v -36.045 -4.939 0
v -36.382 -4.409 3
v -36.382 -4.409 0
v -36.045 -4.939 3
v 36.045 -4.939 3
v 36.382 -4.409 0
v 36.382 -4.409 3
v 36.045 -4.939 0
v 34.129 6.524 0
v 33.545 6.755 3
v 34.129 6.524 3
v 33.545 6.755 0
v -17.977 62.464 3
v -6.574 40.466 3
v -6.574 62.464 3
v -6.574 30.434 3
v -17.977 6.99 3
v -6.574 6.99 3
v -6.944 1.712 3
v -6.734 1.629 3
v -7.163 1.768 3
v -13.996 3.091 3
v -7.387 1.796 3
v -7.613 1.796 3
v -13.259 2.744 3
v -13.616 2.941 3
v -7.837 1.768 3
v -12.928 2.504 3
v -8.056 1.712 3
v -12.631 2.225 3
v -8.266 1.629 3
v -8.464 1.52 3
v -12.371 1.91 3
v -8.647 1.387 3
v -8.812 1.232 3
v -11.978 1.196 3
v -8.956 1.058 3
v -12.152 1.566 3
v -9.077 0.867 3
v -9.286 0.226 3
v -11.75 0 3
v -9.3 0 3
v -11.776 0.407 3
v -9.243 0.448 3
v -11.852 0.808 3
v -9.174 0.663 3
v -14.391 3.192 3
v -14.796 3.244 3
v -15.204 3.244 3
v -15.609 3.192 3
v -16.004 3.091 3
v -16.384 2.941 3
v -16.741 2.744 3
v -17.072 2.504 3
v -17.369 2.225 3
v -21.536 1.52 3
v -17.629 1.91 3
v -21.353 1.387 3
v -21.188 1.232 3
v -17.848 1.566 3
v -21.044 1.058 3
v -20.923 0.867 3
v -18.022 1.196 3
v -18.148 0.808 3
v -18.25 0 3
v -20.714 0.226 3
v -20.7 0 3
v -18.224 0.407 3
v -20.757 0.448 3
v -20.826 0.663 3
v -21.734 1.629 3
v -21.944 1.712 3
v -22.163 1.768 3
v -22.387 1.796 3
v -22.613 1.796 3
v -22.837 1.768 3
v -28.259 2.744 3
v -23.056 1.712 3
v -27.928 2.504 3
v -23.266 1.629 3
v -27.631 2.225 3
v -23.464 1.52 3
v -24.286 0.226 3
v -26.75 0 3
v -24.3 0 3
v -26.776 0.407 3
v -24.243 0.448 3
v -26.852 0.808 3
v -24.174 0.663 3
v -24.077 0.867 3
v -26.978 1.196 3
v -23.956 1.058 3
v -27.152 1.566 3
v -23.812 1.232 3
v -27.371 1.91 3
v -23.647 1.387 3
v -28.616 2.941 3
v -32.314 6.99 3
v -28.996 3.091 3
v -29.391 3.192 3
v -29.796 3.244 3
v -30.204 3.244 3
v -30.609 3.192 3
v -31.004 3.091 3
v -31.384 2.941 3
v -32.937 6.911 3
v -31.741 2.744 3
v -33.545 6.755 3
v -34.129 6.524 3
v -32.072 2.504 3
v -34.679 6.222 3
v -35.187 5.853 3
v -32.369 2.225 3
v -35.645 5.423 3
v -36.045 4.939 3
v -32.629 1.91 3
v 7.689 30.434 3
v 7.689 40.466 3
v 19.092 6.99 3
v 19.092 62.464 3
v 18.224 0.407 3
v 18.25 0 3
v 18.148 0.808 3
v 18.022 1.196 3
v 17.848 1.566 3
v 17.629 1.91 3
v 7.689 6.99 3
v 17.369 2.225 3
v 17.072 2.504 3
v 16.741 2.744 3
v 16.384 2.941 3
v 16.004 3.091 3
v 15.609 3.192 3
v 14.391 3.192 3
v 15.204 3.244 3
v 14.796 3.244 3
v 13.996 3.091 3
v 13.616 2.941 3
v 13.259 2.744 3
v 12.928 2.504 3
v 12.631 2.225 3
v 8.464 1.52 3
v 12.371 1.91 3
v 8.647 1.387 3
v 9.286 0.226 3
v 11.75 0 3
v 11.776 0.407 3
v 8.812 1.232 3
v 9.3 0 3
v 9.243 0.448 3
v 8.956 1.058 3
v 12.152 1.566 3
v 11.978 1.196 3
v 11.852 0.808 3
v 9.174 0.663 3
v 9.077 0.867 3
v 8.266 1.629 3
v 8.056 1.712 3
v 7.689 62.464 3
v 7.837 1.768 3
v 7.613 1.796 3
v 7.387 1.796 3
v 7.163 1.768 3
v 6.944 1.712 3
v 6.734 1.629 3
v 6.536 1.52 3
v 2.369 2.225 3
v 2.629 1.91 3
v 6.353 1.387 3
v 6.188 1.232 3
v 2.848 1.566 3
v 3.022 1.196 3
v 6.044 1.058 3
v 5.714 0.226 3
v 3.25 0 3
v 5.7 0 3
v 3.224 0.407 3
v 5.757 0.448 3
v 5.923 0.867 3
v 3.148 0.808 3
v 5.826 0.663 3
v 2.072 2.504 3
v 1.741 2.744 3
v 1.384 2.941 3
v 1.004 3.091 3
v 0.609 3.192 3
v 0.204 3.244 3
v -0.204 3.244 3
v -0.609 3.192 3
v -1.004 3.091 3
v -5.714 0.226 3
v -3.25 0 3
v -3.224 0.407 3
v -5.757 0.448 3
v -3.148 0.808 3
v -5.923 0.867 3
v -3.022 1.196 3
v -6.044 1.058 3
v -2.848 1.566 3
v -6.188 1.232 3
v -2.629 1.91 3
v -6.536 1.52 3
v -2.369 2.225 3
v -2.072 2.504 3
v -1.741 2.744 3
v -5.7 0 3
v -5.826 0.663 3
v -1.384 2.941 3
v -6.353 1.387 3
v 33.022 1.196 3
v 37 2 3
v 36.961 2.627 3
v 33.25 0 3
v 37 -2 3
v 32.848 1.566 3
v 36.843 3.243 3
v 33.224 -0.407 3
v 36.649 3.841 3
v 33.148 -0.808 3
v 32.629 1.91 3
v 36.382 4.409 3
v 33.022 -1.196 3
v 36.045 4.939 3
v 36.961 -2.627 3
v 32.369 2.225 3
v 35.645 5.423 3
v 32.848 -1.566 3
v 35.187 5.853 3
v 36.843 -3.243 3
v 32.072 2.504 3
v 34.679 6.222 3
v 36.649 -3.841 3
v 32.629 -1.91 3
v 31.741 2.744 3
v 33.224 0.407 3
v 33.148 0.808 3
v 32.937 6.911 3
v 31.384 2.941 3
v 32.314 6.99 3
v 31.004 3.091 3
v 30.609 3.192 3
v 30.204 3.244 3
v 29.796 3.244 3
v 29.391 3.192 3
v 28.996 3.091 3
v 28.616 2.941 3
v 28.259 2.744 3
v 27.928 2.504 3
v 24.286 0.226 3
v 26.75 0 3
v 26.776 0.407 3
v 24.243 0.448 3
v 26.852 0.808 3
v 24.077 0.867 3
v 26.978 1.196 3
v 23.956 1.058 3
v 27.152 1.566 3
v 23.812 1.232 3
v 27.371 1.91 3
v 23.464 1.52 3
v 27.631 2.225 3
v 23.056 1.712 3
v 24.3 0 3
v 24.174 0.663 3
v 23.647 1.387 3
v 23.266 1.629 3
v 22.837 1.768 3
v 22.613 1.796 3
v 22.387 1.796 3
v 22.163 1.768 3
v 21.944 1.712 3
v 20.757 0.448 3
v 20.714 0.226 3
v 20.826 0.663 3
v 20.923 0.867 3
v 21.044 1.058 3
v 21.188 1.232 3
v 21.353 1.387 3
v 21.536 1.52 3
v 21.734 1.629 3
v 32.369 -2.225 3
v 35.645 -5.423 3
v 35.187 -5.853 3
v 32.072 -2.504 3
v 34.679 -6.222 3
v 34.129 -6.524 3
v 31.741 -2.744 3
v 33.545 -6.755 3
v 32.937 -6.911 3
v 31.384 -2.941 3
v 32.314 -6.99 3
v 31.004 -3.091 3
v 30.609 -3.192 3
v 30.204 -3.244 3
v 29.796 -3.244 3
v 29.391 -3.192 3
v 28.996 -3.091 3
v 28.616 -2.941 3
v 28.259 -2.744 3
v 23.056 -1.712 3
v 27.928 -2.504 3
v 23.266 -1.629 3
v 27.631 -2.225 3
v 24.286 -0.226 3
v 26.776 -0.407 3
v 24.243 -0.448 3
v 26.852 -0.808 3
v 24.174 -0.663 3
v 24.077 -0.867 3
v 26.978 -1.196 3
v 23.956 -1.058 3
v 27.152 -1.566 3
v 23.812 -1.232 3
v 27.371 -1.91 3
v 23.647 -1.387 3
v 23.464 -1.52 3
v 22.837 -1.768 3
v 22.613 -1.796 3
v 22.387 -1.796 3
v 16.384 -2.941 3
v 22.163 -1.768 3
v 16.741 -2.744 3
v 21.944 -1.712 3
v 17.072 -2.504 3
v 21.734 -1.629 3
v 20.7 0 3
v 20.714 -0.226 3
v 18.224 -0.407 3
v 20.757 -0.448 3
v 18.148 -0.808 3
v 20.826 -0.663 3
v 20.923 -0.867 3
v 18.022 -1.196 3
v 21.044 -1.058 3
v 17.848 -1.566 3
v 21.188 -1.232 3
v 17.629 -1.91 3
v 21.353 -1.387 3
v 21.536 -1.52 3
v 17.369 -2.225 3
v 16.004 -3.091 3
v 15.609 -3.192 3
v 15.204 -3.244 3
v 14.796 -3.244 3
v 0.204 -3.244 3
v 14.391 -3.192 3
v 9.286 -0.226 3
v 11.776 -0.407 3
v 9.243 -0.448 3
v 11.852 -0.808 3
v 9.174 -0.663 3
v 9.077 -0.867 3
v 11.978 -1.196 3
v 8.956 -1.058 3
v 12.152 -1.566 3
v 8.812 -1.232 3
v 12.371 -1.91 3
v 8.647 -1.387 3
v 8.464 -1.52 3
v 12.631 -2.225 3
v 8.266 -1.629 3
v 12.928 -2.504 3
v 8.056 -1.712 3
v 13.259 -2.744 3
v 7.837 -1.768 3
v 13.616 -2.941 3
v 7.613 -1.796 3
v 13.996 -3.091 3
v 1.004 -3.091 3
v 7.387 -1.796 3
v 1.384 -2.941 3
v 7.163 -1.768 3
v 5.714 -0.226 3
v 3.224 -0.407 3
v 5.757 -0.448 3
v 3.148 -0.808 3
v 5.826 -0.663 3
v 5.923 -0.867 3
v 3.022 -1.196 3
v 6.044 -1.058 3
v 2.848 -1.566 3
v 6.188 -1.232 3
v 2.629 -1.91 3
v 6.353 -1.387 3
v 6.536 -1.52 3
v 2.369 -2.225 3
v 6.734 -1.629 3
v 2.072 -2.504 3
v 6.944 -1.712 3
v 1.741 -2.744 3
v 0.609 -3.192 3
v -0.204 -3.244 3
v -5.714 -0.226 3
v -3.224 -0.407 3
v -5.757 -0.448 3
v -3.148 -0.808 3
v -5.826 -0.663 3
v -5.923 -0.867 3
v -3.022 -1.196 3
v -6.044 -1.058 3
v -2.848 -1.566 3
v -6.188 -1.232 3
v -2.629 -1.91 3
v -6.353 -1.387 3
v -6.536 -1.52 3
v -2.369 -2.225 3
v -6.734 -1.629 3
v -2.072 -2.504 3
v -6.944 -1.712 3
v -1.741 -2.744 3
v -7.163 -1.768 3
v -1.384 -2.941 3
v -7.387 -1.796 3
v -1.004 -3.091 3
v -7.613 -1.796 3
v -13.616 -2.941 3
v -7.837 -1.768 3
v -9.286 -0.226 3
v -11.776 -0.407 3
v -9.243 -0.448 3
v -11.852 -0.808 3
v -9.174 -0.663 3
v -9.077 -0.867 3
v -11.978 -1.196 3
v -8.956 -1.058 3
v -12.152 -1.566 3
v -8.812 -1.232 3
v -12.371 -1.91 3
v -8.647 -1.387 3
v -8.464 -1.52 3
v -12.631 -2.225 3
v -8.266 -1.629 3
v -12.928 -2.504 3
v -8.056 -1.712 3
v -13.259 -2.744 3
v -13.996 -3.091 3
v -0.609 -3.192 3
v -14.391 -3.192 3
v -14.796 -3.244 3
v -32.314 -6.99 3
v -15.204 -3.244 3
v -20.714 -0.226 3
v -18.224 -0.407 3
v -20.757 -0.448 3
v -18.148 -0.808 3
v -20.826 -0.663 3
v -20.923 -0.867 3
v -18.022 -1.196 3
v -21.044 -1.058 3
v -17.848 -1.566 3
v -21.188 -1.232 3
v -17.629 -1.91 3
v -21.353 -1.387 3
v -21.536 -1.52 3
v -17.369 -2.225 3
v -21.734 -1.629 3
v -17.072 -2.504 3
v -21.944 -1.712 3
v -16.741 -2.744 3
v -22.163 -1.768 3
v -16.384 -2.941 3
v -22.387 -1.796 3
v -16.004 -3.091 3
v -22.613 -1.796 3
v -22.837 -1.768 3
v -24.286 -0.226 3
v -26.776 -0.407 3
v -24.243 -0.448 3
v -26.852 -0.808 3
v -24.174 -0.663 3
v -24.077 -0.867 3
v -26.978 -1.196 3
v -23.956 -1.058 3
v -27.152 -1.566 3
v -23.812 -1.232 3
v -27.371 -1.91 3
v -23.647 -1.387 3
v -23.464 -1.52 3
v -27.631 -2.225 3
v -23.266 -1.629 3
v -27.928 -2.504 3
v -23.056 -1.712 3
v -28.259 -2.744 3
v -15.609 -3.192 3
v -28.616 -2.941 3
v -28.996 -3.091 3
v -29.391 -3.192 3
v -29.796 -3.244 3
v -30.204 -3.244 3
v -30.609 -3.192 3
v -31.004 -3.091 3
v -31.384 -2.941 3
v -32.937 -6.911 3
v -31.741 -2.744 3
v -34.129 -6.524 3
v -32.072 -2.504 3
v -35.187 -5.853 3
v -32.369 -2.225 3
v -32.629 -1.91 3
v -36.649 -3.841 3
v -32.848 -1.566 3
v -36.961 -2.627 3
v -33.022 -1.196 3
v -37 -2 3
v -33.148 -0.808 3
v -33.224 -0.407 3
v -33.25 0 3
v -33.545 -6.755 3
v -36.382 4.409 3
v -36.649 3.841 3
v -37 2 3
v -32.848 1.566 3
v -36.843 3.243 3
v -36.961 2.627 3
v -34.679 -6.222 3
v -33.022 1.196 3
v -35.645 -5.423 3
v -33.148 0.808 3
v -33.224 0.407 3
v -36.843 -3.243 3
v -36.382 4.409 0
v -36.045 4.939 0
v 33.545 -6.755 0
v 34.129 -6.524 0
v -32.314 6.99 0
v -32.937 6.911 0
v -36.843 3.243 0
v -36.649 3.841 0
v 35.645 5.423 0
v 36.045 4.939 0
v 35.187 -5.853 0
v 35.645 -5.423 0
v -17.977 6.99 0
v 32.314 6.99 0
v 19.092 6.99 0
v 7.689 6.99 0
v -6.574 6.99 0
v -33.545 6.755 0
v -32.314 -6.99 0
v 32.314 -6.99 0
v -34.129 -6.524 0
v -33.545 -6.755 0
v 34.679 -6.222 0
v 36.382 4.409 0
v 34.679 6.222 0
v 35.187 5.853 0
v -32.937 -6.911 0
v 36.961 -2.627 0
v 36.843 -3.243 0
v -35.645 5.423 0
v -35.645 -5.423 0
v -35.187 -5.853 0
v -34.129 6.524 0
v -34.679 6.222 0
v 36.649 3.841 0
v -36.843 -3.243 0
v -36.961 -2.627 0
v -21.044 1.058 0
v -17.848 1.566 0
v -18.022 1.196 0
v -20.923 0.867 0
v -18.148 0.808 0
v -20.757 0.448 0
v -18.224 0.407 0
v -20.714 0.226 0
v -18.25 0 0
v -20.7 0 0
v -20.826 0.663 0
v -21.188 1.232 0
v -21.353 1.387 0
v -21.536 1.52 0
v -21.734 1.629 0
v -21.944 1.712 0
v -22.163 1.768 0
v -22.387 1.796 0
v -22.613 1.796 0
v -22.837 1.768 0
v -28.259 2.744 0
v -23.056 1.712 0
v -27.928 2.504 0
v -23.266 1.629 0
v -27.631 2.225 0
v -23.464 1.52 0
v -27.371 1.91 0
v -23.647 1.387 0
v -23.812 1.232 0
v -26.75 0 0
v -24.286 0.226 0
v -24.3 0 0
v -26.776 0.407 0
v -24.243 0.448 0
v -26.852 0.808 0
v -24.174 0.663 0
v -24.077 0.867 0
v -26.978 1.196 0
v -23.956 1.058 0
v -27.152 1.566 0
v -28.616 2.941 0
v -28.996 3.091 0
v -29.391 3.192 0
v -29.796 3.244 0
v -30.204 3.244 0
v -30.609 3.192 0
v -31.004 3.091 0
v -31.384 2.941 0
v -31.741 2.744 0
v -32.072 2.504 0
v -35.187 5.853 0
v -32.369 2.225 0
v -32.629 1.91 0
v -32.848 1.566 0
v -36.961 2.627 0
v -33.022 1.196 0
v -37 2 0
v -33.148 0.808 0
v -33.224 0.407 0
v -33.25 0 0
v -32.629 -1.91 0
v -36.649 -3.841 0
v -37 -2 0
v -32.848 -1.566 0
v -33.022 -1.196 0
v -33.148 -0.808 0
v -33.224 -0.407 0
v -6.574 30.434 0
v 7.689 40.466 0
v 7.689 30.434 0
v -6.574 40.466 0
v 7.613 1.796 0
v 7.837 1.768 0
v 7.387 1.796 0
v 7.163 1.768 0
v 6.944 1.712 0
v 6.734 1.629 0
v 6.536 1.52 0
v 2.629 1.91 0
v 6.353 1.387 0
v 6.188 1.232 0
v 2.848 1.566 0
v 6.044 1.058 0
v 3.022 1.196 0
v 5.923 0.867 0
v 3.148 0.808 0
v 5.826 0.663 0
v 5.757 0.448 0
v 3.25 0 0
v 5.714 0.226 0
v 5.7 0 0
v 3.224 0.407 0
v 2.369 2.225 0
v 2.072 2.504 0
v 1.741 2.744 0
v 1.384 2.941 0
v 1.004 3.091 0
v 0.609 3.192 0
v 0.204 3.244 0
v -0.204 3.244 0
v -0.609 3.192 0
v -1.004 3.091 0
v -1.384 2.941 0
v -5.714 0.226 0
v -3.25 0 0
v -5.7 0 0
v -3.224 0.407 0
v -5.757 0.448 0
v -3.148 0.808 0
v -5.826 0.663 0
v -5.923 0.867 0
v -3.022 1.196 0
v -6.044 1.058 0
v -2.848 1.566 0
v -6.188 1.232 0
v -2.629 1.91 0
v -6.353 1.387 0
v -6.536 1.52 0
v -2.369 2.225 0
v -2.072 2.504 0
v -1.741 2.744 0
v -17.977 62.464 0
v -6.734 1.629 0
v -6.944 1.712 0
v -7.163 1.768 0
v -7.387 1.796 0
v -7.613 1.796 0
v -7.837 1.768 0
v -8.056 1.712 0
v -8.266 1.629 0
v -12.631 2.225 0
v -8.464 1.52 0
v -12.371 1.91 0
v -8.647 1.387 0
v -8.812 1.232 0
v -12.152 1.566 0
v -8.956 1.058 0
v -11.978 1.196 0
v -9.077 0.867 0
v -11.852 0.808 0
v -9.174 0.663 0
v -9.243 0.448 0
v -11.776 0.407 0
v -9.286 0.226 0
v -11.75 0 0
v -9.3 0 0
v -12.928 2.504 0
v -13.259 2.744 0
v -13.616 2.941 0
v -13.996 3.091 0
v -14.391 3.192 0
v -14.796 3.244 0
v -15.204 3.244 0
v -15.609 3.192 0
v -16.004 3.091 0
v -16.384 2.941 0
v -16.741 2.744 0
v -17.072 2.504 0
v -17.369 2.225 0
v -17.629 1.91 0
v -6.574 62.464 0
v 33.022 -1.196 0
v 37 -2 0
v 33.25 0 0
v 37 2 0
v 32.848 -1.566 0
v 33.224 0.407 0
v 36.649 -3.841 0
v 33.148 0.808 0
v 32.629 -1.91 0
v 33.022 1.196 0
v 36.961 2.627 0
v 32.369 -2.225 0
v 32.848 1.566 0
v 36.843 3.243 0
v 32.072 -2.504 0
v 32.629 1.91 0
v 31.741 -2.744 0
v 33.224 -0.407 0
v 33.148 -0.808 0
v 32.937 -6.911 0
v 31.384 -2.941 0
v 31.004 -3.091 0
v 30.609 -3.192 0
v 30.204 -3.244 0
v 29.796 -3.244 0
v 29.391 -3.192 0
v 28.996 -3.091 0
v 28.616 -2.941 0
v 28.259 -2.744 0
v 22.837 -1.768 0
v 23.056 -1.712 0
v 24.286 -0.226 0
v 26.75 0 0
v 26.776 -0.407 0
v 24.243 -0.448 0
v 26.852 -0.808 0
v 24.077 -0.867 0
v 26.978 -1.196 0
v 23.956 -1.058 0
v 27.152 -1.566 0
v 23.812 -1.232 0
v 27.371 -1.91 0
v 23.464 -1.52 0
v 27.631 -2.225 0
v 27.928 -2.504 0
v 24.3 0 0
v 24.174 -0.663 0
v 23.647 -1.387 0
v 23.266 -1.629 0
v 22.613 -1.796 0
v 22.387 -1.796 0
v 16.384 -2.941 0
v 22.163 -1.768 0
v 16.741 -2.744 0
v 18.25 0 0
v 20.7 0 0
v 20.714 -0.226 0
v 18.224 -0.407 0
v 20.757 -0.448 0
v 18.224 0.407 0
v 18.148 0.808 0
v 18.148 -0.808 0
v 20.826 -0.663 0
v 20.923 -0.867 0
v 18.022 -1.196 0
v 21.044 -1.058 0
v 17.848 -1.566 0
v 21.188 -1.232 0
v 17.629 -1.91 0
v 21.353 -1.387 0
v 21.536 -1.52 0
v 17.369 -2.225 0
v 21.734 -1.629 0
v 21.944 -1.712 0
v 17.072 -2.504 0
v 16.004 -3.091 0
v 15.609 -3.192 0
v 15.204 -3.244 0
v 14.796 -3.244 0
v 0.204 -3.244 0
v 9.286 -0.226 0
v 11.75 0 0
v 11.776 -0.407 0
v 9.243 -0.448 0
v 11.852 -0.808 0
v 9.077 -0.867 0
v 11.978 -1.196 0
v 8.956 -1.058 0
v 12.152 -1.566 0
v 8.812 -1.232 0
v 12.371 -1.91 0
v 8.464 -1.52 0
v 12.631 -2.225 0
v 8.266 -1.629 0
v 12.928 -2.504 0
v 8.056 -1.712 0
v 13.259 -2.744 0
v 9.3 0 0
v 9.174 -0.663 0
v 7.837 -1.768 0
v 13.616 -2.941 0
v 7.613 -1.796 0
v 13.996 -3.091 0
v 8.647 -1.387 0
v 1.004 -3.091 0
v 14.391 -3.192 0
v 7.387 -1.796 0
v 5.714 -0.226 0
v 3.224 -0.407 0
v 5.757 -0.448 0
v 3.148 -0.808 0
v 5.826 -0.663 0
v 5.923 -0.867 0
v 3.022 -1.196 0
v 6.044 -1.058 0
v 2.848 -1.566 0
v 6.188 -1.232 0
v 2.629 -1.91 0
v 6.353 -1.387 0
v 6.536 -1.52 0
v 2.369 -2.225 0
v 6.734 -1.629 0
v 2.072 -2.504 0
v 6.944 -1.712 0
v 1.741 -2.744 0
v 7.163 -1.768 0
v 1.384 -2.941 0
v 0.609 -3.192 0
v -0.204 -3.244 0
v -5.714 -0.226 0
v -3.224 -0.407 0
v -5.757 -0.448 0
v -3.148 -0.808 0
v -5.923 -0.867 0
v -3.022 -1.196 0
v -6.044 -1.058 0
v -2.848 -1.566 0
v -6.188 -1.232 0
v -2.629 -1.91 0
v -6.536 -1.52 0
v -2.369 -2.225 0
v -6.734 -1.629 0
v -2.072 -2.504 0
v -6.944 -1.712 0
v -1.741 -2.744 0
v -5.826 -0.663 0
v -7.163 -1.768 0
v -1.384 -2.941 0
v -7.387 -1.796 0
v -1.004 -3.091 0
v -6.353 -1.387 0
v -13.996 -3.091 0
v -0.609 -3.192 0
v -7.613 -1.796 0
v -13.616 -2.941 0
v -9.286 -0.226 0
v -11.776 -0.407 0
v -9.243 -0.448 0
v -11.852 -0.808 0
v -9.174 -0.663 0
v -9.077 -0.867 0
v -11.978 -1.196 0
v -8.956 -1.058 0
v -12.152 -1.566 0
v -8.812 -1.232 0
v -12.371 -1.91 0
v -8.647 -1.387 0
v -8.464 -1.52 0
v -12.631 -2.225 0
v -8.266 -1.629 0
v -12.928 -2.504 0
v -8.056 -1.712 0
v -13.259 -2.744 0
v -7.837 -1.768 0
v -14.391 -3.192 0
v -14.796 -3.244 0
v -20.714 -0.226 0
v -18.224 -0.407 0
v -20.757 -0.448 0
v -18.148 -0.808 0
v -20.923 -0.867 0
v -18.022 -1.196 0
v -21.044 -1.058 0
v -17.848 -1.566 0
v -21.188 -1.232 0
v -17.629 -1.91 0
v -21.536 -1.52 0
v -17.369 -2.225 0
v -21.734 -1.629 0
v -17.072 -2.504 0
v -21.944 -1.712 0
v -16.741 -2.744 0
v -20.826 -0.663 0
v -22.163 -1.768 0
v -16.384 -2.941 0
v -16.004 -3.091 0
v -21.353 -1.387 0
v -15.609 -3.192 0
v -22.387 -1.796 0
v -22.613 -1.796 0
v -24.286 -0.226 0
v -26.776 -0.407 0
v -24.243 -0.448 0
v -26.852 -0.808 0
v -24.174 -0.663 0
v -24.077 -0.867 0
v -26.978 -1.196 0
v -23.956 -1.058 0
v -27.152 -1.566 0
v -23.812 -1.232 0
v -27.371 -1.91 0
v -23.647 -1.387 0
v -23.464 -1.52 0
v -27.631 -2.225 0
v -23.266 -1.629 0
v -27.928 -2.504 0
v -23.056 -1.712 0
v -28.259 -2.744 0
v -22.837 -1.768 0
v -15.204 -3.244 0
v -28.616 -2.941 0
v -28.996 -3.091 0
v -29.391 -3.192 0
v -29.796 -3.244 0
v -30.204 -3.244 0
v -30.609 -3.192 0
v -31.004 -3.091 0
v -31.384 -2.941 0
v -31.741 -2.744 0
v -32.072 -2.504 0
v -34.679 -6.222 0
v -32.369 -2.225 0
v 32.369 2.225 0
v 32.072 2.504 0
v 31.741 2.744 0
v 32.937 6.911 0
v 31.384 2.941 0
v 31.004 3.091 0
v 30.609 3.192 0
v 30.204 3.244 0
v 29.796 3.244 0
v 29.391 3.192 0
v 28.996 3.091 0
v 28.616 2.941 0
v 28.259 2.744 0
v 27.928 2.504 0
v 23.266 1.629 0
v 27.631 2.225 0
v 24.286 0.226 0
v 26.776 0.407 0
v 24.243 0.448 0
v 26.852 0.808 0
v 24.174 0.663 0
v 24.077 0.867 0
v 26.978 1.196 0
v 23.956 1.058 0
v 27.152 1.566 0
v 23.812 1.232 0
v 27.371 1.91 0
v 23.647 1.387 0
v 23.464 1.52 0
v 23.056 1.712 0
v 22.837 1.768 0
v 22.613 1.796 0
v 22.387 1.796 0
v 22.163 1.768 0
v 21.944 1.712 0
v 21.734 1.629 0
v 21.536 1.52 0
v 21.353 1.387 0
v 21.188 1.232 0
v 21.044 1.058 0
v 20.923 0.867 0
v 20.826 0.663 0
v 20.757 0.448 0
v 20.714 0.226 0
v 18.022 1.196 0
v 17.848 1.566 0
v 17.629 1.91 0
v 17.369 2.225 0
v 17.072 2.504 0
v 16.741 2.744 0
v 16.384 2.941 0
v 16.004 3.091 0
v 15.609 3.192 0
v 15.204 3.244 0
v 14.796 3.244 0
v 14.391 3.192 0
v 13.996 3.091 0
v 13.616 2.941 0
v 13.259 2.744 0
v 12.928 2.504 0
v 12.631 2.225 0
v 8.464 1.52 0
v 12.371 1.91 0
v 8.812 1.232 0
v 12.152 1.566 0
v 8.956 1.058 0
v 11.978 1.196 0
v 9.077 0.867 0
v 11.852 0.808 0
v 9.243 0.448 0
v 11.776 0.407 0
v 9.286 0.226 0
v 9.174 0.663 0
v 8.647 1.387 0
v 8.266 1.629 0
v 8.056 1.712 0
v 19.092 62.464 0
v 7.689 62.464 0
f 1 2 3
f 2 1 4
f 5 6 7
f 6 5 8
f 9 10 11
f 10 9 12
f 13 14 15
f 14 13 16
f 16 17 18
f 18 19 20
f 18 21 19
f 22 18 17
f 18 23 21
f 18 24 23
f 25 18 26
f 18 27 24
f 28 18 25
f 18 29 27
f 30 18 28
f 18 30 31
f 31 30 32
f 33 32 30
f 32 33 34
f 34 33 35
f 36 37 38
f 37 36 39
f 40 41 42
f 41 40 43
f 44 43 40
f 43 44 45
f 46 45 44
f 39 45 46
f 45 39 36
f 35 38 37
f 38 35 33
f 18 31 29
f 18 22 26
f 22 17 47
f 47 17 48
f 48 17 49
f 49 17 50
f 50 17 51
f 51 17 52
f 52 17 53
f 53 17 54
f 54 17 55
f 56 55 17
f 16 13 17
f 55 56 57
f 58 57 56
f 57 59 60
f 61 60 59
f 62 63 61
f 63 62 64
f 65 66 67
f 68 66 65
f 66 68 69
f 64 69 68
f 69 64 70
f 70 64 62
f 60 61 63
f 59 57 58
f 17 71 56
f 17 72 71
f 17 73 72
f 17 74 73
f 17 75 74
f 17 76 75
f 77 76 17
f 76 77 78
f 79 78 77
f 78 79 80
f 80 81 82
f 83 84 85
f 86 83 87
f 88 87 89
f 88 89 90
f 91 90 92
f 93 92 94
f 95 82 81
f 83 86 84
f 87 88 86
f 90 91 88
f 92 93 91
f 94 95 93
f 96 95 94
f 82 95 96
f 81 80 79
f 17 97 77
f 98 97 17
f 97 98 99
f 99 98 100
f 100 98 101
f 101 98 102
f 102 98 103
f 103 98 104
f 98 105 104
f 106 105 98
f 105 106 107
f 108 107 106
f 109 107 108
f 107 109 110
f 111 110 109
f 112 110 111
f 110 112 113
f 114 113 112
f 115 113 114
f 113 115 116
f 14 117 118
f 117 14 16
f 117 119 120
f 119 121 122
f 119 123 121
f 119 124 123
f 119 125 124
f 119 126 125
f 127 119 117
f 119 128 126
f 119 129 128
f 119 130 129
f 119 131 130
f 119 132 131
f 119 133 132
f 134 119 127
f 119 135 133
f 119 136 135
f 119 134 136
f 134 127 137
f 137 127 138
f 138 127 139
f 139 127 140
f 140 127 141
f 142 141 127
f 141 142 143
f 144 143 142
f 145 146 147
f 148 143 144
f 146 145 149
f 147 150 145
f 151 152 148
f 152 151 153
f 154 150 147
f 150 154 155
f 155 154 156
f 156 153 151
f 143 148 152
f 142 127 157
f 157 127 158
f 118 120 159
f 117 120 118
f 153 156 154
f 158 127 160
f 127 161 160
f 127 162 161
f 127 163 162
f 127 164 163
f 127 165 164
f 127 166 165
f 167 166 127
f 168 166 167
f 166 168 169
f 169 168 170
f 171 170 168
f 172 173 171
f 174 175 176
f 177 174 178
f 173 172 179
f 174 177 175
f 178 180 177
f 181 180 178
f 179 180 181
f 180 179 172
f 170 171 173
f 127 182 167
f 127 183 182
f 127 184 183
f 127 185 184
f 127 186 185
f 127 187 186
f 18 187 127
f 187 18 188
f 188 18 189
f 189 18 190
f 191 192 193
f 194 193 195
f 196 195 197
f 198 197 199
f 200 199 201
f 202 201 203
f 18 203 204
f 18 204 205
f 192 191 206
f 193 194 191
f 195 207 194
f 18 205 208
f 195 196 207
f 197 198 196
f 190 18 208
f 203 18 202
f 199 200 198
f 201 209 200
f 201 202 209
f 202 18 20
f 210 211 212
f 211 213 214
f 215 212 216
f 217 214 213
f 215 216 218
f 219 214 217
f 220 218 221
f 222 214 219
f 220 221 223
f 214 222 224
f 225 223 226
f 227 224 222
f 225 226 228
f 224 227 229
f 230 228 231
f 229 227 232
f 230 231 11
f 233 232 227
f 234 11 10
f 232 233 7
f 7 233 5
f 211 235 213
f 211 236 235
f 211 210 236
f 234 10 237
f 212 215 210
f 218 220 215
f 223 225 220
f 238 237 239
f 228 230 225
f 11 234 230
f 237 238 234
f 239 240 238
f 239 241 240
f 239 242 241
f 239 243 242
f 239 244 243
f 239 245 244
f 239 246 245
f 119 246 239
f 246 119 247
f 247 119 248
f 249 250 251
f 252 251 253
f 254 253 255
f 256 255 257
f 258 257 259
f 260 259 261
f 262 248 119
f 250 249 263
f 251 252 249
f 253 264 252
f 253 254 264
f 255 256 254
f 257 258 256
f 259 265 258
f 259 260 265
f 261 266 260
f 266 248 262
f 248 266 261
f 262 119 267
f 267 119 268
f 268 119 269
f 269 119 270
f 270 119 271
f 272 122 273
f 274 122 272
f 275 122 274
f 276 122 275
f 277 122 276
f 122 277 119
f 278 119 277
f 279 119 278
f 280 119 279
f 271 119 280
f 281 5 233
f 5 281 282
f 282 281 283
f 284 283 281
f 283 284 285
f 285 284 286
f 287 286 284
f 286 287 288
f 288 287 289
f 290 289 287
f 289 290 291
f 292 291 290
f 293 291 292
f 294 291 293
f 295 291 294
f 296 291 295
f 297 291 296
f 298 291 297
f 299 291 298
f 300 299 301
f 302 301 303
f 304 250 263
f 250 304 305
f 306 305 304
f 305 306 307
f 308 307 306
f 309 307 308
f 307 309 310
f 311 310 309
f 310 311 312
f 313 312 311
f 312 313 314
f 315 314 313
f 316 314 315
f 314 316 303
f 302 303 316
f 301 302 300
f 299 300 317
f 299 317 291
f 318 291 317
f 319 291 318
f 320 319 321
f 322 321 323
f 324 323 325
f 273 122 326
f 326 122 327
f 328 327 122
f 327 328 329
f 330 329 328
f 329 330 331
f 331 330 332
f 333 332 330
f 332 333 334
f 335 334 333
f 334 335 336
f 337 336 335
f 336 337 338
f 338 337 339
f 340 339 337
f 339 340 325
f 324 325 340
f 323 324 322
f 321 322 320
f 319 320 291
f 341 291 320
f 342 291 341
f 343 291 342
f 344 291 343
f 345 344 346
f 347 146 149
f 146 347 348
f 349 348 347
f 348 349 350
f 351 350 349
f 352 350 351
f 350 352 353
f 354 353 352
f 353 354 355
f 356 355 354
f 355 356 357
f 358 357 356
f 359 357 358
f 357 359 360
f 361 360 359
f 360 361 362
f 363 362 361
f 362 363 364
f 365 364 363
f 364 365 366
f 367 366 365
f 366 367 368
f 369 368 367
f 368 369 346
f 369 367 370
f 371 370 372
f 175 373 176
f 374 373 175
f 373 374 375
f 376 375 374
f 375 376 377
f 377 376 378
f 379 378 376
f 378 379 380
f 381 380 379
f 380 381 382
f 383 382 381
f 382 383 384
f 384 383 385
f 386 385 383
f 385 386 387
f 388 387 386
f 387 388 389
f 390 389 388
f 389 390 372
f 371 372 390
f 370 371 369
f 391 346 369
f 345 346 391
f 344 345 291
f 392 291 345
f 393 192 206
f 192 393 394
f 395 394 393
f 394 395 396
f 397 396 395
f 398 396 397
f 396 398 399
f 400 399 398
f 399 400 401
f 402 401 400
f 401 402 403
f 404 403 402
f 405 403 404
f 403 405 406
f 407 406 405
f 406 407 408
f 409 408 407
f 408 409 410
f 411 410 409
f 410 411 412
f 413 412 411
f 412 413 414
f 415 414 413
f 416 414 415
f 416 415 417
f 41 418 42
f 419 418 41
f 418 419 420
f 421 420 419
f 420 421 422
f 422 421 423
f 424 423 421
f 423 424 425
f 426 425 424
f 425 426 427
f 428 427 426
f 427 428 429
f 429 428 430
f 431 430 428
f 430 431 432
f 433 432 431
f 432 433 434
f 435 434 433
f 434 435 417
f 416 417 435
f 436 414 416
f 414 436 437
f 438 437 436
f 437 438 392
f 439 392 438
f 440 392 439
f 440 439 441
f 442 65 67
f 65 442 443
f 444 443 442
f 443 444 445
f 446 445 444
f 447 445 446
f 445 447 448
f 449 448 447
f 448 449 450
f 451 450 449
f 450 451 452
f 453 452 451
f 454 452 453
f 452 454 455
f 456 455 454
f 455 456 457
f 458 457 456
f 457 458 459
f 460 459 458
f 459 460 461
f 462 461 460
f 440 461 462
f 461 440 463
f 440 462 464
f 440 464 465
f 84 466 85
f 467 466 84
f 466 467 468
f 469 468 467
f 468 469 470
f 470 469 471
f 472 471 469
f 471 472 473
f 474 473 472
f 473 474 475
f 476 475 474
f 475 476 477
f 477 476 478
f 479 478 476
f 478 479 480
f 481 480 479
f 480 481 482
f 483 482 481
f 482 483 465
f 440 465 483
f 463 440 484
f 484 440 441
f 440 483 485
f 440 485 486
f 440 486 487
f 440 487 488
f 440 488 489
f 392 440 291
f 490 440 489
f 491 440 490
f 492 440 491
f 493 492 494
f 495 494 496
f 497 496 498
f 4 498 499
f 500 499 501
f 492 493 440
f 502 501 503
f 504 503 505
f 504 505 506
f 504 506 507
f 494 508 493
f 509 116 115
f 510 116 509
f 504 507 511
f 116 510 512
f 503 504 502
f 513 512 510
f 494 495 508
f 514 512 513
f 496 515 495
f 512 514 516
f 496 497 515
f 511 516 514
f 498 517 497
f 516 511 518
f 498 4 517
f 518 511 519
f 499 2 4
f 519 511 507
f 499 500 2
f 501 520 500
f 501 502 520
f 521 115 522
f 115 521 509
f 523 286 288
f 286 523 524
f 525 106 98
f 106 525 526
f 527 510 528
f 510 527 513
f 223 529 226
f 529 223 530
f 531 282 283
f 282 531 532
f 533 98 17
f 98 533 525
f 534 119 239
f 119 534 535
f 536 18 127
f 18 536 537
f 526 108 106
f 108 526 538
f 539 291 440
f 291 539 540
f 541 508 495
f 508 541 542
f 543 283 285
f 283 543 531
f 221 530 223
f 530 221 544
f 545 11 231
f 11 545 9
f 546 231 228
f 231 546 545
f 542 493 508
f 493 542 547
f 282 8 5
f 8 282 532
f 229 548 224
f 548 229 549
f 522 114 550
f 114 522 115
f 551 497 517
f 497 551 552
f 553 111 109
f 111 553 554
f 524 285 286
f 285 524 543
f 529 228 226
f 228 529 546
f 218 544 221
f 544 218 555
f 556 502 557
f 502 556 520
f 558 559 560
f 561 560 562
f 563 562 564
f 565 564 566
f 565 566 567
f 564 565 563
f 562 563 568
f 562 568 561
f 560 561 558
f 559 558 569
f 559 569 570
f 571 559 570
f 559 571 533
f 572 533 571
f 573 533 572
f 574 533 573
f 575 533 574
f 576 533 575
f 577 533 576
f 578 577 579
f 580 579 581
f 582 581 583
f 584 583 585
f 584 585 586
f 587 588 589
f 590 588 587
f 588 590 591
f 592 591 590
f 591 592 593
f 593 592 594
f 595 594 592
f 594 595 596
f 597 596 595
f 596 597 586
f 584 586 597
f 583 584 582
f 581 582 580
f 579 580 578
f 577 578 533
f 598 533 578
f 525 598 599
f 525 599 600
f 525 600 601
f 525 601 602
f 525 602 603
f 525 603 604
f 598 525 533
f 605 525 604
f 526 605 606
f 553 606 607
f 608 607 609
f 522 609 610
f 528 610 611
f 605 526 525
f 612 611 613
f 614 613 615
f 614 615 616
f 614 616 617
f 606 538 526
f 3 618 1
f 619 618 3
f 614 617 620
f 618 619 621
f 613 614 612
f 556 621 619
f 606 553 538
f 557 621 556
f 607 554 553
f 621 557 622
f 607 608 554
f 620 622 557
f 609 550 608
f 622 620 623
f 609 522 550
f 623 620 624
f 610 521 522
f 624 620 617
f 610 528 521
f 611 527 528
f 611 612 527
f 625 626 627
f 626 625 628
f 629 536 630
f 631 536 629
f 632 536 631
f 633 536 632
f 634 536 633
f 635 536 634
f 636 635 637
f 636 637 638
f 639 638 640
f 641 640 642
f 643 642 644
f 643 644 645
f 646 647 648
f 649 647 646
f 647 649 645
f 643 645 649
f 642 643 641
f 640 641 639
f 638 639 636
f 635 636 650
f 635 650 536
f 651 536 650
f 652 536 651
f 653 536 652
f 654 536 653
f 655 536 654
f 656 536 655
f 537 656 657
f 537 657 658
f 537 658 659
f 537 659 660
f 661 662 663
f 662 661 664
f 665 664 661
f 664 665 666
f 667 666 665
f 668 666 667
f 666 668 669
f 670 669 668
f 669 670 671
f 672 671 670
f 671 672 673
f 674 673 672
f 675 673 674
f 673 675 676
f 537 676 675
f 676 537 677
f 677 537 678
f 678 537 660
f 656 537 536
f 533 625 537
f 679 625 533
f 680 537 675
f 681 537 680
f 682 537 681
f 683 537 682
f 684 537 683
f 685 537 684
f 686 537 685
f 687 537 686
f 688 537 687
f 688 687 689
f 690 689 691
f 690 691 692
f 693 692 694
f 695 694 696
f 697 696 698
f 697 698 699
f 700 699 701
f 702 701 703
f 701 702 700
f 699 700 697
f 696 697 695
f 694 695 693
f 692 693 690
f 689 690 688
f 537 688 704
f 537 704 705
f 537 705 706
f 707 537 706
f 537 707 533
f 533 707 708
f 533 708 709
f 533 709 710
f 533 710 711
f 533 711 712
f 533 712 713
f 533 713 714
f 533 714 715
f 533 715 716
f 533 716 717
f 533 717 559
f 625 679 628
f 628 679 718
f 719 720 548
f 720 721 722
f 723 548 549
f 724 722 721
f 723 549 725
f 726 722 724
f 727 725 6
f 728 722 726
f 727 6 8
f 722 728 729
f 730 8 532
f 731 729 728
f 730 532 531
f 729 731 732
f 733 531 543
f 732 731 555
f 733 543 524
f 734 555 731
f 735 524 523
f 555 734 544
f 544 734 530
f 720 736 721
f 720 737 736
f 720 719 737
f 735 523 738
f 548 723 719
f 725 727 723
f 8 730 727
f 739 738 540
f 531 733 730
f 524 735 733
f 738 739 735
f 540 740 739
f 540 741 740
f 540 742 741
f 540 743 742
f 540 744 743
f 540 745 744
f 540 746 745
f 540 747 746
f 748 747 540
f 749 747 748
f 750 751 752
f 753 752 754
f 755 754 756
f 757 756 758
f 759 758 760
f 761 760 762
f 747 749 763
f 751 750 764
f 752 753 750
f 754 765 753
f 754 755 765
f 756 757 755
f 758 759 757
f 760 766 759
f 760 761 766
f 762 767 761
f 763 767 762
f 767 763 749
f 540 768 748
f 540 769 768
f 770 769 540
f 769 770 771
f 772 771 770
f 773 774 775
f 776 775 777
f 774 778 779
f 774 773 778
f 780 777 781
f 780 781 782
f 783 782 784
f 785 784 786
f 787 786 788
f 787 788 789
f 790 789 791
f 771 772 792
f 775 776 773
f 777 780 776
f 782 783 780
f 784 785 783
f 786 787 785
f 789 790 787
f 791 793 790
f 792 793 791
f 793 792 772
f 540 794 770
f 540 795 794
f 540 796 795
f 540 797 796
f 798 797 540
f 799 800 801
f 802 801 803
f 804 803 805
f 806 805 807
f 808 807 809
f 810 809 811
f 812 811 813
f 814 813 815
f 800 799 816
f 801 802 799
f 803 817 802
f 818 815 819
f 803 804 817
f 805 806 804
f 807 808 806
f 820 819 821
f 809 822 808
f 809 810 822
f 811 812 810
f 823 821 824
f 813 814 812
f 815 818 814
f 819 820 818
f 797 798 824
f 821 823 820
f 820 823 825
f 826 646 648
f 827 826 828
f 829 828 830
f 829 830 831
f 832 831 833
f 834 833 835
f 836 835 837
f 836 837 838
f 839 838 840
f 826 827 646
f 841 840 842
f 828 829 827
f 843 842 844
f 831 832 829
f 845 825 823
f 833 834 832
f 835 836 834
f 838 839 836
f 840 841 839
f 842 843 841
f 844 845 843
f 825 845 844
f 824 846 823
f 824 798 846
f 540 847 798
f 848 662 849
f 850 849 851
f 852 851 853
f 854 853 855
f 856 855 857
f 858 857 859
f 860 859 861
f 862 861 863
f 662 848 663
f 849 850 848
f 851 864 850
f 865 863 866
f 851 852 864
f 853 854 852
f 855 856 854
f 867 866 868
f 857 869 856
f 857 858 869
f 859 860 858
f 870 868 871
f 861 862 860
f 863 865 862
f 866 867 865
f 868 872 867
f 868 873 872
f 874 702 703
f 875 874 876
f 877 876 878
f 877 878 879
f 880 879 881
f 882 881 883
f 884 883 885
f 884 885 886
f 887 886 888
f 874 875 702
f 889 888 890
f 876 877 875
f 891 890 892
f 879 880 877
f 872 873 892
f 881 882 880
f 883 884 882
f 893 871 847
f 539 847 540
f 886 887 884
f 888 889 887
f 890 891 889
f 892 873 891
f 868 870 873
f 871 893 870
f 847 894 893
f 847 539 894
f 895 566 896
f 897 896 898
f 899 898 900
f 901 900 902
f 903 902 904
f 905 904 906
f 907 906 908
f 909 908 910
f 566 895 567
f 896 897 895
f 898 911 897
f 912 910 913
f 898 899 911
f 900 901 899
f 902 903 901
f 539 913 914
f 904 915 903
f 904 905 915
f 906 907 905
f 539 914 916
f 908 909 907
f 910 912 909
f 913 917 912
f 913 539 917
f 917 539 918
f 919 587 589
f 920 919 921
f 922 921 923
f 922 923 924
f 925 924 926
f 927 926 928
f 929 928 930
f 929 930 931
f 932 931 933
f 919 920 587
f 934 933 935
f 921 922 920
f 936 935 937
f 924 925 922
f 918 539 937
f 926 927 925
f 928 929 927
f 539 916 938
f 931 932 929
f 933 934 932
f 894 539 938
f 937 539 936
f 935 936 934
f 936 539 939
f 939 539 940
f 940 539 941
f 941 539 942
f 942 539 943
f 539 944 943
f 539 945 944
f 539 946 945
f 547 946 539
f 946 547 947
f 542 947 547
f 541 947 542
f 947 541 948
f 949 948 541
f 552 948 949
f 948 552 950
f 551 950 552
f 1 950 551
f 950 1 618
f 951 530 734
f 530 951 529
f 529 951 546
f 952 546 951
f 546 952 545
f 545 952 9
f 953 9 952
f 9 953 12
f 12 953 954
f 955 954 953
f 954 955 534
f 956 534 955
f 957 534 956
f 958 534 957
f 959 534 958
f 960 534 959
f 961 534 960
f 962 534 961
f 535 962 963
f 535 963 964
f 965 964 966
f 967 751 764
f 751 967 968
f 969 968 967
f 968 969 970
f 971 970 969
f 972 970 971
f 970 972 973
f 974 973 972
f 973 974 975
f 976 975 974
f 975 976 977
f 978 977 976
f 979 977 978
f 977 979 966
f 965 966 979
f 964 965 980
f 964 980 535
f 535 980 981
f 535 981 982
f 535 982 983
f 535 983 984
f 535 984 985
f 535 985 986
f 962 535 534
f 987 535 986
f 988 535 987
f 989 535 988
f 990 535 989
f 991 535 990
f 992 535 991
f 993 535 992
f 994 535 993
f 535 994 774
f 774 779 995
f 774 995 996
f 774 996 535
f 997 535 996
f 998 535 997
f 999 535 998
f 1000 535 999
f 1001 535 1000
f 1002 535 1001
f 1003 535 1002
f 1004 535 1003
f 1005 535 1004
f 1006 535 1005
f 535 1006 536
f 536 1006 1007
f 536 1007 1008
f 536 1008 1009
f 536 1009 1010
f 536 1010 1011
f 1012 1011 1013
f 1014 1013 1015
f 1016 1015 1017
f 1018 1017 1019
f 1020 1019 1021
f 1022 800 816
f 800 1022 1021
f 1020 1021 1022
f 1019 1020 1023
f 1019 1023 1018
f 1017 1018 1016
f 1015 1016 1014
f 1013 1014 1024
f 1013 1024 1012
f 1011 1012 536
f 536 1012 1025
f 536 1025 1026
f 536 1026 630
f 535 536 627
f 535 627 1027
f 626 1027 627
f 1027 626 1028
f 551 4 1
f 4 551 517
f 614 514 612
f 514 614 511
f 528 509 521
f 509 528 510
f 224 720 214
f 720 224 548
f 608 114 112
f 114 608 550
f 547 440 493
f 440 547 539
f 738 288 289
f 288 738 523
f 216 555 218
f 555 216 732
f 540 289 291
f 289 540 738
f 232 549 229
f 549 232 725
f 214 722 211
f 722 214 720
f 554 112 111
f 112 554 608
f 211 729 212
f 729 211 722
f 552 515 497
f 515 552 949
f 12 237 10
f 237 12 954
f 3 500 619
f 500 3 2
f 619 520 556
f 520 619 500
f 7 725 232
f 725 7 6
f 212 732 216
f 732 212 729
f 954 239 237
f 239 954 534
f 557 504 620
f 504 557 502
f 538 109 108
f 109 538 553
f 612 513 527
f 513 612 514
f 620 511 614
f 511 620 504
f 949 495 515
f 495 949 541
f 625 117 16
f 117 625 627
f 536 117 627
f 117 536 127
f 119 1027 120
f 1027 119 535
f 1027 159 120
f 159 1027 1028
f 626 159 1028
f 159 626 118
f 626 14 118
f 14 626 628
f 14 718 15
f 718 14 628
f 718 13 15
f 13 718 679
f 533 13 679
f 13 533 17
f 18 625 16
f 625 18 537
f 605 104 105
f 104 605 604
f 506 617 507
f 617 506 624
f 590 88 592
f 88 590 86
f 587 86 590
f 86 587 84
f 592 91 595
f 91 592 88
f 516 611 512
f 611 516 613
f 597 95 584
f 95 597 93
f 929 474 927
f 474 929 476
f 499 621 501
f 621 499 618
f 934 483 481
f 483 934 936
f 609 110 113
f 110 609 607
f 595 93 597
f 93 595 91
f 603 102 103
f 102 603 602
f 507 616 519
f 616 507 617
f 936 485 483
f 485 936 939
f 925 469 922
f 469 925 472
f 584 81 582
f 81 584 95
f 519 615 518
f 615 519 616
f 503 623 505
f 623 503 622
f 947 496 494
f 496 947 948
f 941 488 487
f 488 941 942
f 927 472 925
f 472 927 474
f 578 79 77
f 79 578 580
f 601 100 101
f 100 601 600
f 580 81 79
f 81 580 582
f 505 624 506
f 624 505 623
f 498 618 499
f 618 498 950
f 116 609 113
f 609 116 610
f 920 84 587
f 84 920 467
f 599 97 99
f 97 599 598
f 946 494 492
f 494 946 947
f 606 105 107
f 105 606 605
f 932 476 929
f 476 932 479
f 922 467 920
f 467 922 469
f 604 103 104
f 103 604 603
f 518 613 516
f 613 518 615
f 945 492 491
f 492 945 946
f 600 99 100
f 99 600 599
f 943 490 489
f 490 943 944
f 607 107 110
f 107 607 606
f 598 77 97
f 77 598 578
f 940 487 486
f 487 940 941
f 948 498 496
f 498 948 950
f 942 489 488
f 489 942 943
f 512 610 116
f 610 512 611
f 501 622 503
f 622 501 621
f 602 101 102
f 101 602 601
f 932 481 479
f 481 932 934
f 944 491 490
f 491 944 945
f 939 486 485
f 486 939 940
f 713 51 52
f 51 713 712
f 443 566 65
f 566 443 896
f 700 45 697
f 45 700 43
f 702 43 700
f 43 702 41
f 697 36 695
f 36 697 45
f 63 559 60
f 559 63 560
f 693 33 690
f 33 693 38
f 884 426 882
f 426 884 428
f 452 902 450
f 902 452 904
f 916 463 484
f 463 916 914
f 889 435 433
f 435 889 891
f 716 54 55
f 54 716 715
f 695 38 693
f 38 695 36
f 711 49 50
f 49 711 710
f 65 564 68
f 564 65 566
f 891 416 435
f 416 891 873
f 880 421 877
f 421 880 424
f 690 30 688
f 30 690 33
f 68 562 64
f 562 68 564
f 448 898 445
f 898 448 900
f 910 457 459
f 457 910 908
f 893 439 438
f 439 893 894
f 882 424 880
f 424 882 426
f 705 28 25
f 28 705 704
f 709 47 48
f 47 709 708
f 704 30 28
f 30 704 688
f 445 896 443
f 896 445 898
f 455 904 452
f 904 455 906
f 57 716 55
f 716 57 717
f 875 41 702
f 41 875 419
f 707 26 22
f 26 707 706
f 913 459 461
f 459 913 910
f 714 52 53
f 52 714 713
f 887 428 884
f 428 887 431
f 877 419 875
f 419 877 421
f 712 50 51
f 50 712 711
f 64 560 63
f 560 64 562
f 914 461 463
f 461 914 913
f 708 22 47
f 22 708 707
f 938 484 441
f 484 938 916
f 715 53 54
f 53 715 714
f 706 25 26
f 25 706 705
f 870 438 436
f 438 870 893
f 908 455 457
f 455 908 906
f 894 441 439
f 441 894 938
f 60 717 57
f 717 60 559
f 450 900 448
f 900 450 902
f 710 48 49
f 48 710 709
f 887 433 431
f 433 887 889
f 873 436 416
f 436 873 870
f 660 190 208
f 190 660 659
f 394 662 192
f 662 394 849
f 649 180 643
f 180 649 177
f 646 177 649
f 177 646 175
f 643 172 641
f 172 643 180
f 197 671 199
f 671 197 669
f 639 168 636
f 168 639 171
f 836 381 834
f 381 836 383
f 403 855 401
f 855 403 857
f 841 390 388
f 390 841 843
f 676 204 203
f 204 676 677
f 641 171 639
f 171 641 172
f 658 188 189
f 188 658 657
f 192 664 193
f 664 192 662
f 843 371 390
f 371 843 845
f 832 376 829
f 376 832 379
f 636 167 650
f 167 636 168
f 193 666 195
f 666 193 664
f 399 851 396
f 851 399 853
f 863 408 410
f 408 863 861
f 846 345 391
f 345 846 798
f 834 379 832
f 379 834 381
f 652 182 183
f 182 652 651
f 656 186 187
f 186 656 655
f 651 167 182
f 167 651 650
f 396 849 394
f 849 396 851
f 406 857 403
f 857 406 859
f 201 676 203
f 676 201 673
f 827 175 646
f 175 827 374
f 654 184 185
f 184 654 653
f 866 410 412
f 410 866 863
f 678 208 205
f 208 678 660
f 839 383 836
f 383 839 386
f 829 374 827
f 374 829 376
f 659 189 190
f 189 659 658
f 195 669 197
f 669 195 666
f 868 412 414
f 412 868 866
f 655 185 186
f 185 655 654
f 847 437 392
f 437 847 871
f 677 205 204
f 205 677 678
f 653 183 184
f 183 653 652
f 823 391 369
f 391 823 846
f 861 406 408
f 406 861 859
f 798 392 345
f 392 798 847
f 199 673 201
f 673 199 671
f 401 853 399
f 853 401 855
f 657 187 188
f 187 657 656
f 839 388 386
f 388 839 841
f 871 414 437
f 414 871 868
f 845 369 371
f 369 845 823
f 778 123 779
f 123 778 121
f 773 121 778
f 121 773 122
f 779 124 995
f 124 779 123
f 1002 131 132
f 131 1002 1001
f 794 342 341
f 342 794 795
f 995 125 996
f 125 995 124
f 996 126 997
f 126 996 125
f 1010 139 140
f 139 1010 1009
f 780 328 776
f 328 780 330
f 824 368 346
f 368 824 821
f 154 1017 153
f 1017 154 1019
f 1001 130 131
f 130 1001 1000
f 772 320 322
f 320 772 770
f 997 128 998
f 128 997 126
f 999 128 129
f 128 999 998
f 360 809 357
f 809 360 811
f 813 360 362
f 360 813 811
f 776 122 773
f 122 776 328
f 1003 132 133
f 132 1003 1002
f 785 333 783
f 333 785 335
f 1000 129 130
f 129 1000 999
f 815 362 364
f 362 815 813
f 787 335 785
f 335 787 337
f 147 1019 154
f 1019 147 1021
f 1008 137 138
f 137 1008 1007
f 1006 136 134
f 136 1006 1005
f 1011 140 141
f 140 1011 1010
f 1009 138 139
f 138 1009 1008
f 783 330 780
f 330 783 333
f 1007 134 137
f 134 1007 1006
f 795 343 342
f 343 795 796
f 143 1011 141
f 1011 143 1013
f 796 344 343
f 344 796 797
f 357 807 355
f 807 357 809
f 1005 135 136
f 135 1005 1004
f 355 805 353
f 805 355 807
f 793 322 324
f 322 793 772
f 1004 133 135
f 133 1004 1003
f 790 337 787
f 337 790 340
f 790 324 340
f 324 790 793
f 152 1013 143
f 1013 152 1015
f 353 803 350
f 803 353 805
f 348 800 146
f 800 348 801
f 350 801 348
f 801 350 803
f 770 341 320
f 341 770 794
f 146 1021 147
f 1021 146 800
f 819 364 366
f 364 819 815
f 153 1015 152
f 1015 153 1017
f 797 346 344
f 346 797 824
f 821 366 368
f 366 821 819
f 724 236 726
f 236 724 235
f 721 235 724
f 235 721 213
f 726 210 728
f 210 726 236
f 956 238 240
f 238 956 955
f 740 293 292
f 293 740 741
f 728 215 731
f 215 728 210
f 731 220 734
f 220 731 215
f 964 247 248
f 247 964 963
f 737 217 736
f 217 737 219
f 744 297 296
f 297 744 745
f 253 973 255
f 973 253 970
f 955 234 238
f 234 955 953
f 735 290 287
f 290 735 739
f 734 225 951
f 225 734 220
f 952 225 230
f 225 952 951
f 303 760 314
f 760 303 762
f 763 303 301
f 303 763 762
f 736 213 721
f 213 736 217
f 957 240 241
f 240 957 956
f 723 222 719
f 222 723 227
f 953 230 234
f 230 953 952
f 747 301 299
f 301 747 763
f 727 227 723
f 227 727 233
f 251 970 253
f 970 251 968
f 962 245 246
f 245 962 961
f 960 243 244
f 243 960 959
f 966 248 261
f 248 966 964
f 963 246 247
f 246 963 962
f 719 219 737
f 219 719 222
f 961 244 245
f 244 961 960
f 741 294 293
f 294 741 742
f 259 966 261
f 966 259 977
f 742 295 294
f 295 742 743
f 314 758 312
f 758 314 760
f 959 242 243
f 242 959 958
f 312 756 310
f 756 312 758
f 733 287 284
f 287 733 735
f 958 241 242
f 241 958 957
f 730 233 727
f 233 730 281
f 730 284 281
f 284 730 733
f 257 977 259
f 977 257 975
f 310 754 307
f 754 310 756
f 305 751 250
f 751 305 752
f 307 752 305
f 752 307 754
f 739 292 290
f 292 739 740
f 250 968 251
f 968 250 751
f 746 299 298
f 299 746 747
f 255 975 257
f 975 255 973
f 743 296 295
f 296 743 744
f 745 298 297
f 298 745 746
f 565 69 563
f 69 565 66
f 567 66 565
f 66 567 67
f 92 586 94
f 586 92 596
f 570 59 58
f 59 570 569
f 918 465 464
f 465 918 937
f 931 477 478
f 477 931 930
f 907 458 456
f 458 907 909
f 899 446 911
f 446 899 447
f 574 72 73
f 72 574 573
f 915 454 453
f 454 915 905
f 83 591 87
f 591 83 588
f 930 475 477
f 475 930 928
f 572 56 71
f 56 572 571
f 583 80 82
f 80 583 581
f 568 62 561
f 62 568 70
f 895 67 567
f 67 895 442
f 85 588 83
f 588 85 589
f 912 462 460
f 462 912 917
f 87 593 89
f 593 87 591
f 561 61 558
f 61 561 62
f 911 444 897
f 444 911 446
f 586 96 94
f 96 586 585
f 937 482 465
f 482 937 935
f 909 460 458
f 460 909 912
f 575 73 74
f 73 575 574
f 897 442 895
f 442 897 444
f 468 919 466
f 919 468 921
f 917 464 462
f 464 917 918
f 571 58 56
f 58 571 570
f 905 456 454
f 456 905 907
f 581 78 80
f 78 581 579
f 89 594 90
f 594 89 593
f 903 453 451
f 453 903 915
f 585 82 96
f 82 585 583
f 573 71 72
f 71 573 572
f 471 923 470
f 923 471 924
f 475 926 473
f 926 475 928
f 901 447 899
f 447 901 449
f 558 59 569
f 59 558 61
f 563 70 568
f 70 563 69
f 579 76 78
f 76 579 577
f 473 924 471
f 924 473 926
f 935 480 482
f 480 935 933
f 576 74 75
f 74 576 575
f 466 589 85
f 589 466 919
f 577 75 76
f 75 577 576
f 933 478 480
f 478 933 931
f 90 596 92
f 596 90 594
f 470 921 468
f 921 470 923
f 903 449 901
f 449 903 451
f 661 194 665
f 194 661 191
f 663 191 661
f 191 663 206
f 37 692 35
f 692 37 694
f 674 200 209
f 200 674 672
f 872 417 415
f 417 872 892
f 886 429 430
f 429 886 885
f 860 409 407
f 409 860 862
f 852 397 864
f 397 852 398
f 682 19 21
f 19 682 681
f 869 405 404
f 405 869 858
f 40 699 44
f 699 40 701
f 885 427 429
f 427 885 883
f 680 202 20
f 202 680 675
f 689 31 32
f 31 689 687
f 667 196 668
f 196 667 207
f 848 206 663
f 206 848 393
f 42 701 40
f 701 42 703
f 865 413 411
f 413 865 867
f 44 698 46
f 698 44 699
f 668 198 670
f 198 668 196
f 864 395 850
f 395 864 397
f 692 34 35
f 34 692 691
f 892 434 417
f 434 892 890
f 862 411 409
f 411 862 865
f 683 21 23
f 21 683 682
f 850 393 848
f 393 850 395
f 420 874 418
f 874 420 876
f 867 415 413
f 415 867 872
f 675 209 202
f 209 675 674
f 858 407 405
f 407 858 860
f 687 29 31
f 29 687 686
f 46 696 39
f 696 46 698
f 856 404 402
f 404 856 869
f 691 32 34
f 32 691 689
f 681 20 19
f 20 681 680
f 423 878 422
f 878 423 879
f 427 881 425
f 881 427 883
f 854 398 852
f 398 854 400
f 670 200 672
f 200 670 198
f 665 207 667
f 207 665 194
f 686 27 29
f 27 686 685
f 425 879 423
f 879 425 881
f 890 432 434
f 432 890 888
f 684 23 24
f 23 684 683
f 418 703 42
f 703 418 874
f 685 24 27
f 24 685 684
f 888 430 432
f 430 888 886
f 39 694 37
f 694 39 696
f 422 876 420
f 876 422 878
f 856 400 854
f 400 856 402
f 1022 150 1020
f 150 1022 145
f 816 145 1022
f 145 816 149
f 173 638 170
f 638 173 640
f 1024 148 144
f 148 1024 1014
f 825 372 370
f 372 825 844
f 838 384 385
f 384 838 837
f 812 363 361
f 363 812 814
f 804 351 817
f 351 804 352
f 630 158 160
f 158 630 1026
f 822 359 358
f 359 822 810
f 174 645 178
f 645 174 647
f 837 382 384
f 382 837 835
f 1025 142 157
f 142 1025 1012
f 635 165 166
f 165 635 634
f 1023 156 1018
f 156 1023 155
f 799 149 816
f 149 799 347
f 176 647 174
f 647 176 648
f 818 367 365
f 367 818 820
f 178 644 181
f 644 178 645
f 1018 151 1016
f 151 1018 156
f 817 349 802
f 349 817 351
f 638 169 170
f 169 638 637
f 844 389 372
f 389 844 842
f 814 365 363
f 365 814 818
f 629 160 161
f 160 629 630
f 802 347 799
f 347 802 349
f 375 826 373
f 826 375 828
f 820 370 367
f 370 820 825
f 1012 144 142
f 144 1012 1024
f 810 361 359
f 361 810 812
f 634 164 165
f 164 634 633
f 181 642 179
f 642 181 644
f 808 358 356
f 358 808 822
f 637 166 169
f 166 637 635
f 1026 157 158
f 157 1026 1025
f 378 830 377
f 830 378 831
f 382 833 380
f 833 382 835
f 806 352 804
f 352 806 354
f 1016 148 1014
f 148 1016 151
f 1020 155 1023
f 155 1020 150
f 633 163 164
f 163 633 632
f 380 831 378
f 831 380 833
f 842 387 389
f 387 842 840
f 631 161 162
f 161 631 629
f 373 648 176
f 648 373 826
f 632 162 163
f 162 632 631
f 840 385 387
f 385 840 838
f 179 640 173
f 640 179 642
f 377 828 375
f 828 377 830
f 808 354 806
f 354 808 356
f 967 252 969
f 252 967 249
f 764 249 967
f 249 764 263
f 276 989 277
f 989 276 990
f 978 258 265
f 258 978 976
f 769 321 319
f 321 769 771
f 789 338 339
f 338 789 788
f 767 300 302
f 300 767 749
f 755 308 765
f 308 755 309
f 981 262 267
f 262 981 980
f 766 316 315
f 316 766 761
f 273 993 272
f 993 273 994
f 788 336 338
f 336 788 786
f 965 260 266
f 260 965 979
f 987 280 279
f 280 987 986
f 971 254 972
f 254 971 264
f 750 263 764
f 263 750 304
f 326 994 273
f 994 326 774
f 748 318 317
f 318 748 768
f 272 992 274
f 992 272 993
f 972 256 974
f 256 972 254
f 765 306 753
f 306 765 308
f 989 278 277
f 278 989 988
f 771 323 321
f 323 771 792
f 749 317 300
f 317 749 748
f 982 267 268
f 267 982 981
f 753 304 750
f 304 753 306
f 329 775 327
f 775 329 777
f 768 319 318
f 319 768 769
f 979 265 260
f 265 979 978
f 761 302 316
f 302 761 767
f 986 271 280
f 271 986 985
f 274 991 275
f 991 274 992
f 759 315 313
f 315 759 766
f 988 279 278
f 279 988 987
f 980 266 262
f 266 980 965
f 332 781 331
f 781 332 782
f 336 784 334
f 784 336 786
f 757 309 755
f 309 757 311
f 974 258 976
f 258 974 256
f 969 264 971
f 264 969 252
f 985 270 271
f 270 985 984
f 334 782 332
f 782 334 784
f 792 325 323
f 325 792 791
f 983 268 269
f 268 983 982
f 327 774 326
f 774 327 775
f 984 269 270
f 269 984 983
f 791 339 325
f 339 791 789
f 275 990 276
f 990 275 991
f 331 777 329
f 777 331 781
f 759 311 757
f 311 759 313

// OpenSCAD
$fn = 50;


difference() {
	union() {
		hull() {
			translate(v = [-32.0000000000, 2.0000000000, 0]) {
				cylinder(h = 3, r = 5);
			}
			translate(v = [32.0000000000, 2.0000000000, 0]) {
				cylinder(h = 3, r = 5);
			}
			translate(v = [-32.0000000000, -2.0000000000, 0]) {
				cylinder(h = 3, r = 5);
			}
			translate(v = [32.0000000000, -2.0000000000, 0]) {
				cylinder(h = 3, r = 5);
			}
		}
		translate(v = [0, 61.1111111111, 0]) {
			linear_extrude(height = 3) {
				text(font = "DejaVu Sans Mono:style=Bold", halign = "center", size = 57.0000000000, text = "H", valign = "top");
			}
		}
	}
	union() {
		translate(v = [-30.0000000000, 0.0000000000, 0]) {
			translate(v = [0, 0, -100]) {
				cylinder(h = 200, r = 3.2500000000);
			}
		}
		translate(v = [-15.0000000000, 0.0000000000, 0]) {
			translate(v = [0, 0, -100]) {
				cylinder(h = 200, r = 3.2500000000);
			}
		}
		translate(v = [0, 0, -100]) {
			cylinder(h = 200, r = 3.2500000000);
		}
		translate(v = [15.0000000000, 0.0000000000, 0]) {
			translate(v = [0, 0, -100]) {
				cylinder(h = 200, r = 3.2500000000);
			}
		}
		translate(v = [30.0000000000, 0.0000000000, 0]) {
			translate(v = [0, 0, -100]) {
				cylinder(h = 200, r = 3.2500000000);
			}
		}
		translate(v = [-30.0000000000, 0.0000000000, 0]) {
			translate(v = [0, 0, -100]) {
				cylinder(h = 200, r = 1.8000000000);
			}
		}
		translate(v = [-22.5000000000, 0.0000000000, 0]) {
			translate(v = [0, 0, -100]) {
				cylinder(h = 200, r = 1.8000000000);
			}
		}
		translate(v = [-15.0000000000, 0.0000000000, 0]) {
			translate(v = [0, 0, -100]) {
				cylinder(h = 200, r = 1.8000000000);
			}
		}
		translate(v = [-7.5000000000, 0.0000000000, 0]) {
			translate(v = [0, 0, -100]) {
				cylinder(h = 200, r = 1.8000000000);
			}
		}
		translate(v = [0, 0, -100]) {
			cylinder(h = 200, r = 1.8000000000);
		}
		translate(v = [7.5000000000, 0.0000000000, 0]) {
			translate(v = [0, 0, -100]) {
				cylinder(h = 200, r = 1.8000000000);
			}
		}
		translate(v = [15.0000000000, 0.0000000000, 0]) {
			translate(v = [0, 0, -100]) {
				cylinder(h = 200, r = 1.8000000000);
			}
		}
		translate(v = [22.5000000000, 0.0000000000, 0]) {
			translate(v = [0, 0, -100]) {
				cylinder(h = 200, r = 1.8000000000);
			}
		}
		translate(v = [30.0000000000, 0.0000000000, 0]) {
			translate(v = [0, 0, -100]) {
				cylinder(h = 200, r = 1.8000000000);
			}
		}
	}
}
